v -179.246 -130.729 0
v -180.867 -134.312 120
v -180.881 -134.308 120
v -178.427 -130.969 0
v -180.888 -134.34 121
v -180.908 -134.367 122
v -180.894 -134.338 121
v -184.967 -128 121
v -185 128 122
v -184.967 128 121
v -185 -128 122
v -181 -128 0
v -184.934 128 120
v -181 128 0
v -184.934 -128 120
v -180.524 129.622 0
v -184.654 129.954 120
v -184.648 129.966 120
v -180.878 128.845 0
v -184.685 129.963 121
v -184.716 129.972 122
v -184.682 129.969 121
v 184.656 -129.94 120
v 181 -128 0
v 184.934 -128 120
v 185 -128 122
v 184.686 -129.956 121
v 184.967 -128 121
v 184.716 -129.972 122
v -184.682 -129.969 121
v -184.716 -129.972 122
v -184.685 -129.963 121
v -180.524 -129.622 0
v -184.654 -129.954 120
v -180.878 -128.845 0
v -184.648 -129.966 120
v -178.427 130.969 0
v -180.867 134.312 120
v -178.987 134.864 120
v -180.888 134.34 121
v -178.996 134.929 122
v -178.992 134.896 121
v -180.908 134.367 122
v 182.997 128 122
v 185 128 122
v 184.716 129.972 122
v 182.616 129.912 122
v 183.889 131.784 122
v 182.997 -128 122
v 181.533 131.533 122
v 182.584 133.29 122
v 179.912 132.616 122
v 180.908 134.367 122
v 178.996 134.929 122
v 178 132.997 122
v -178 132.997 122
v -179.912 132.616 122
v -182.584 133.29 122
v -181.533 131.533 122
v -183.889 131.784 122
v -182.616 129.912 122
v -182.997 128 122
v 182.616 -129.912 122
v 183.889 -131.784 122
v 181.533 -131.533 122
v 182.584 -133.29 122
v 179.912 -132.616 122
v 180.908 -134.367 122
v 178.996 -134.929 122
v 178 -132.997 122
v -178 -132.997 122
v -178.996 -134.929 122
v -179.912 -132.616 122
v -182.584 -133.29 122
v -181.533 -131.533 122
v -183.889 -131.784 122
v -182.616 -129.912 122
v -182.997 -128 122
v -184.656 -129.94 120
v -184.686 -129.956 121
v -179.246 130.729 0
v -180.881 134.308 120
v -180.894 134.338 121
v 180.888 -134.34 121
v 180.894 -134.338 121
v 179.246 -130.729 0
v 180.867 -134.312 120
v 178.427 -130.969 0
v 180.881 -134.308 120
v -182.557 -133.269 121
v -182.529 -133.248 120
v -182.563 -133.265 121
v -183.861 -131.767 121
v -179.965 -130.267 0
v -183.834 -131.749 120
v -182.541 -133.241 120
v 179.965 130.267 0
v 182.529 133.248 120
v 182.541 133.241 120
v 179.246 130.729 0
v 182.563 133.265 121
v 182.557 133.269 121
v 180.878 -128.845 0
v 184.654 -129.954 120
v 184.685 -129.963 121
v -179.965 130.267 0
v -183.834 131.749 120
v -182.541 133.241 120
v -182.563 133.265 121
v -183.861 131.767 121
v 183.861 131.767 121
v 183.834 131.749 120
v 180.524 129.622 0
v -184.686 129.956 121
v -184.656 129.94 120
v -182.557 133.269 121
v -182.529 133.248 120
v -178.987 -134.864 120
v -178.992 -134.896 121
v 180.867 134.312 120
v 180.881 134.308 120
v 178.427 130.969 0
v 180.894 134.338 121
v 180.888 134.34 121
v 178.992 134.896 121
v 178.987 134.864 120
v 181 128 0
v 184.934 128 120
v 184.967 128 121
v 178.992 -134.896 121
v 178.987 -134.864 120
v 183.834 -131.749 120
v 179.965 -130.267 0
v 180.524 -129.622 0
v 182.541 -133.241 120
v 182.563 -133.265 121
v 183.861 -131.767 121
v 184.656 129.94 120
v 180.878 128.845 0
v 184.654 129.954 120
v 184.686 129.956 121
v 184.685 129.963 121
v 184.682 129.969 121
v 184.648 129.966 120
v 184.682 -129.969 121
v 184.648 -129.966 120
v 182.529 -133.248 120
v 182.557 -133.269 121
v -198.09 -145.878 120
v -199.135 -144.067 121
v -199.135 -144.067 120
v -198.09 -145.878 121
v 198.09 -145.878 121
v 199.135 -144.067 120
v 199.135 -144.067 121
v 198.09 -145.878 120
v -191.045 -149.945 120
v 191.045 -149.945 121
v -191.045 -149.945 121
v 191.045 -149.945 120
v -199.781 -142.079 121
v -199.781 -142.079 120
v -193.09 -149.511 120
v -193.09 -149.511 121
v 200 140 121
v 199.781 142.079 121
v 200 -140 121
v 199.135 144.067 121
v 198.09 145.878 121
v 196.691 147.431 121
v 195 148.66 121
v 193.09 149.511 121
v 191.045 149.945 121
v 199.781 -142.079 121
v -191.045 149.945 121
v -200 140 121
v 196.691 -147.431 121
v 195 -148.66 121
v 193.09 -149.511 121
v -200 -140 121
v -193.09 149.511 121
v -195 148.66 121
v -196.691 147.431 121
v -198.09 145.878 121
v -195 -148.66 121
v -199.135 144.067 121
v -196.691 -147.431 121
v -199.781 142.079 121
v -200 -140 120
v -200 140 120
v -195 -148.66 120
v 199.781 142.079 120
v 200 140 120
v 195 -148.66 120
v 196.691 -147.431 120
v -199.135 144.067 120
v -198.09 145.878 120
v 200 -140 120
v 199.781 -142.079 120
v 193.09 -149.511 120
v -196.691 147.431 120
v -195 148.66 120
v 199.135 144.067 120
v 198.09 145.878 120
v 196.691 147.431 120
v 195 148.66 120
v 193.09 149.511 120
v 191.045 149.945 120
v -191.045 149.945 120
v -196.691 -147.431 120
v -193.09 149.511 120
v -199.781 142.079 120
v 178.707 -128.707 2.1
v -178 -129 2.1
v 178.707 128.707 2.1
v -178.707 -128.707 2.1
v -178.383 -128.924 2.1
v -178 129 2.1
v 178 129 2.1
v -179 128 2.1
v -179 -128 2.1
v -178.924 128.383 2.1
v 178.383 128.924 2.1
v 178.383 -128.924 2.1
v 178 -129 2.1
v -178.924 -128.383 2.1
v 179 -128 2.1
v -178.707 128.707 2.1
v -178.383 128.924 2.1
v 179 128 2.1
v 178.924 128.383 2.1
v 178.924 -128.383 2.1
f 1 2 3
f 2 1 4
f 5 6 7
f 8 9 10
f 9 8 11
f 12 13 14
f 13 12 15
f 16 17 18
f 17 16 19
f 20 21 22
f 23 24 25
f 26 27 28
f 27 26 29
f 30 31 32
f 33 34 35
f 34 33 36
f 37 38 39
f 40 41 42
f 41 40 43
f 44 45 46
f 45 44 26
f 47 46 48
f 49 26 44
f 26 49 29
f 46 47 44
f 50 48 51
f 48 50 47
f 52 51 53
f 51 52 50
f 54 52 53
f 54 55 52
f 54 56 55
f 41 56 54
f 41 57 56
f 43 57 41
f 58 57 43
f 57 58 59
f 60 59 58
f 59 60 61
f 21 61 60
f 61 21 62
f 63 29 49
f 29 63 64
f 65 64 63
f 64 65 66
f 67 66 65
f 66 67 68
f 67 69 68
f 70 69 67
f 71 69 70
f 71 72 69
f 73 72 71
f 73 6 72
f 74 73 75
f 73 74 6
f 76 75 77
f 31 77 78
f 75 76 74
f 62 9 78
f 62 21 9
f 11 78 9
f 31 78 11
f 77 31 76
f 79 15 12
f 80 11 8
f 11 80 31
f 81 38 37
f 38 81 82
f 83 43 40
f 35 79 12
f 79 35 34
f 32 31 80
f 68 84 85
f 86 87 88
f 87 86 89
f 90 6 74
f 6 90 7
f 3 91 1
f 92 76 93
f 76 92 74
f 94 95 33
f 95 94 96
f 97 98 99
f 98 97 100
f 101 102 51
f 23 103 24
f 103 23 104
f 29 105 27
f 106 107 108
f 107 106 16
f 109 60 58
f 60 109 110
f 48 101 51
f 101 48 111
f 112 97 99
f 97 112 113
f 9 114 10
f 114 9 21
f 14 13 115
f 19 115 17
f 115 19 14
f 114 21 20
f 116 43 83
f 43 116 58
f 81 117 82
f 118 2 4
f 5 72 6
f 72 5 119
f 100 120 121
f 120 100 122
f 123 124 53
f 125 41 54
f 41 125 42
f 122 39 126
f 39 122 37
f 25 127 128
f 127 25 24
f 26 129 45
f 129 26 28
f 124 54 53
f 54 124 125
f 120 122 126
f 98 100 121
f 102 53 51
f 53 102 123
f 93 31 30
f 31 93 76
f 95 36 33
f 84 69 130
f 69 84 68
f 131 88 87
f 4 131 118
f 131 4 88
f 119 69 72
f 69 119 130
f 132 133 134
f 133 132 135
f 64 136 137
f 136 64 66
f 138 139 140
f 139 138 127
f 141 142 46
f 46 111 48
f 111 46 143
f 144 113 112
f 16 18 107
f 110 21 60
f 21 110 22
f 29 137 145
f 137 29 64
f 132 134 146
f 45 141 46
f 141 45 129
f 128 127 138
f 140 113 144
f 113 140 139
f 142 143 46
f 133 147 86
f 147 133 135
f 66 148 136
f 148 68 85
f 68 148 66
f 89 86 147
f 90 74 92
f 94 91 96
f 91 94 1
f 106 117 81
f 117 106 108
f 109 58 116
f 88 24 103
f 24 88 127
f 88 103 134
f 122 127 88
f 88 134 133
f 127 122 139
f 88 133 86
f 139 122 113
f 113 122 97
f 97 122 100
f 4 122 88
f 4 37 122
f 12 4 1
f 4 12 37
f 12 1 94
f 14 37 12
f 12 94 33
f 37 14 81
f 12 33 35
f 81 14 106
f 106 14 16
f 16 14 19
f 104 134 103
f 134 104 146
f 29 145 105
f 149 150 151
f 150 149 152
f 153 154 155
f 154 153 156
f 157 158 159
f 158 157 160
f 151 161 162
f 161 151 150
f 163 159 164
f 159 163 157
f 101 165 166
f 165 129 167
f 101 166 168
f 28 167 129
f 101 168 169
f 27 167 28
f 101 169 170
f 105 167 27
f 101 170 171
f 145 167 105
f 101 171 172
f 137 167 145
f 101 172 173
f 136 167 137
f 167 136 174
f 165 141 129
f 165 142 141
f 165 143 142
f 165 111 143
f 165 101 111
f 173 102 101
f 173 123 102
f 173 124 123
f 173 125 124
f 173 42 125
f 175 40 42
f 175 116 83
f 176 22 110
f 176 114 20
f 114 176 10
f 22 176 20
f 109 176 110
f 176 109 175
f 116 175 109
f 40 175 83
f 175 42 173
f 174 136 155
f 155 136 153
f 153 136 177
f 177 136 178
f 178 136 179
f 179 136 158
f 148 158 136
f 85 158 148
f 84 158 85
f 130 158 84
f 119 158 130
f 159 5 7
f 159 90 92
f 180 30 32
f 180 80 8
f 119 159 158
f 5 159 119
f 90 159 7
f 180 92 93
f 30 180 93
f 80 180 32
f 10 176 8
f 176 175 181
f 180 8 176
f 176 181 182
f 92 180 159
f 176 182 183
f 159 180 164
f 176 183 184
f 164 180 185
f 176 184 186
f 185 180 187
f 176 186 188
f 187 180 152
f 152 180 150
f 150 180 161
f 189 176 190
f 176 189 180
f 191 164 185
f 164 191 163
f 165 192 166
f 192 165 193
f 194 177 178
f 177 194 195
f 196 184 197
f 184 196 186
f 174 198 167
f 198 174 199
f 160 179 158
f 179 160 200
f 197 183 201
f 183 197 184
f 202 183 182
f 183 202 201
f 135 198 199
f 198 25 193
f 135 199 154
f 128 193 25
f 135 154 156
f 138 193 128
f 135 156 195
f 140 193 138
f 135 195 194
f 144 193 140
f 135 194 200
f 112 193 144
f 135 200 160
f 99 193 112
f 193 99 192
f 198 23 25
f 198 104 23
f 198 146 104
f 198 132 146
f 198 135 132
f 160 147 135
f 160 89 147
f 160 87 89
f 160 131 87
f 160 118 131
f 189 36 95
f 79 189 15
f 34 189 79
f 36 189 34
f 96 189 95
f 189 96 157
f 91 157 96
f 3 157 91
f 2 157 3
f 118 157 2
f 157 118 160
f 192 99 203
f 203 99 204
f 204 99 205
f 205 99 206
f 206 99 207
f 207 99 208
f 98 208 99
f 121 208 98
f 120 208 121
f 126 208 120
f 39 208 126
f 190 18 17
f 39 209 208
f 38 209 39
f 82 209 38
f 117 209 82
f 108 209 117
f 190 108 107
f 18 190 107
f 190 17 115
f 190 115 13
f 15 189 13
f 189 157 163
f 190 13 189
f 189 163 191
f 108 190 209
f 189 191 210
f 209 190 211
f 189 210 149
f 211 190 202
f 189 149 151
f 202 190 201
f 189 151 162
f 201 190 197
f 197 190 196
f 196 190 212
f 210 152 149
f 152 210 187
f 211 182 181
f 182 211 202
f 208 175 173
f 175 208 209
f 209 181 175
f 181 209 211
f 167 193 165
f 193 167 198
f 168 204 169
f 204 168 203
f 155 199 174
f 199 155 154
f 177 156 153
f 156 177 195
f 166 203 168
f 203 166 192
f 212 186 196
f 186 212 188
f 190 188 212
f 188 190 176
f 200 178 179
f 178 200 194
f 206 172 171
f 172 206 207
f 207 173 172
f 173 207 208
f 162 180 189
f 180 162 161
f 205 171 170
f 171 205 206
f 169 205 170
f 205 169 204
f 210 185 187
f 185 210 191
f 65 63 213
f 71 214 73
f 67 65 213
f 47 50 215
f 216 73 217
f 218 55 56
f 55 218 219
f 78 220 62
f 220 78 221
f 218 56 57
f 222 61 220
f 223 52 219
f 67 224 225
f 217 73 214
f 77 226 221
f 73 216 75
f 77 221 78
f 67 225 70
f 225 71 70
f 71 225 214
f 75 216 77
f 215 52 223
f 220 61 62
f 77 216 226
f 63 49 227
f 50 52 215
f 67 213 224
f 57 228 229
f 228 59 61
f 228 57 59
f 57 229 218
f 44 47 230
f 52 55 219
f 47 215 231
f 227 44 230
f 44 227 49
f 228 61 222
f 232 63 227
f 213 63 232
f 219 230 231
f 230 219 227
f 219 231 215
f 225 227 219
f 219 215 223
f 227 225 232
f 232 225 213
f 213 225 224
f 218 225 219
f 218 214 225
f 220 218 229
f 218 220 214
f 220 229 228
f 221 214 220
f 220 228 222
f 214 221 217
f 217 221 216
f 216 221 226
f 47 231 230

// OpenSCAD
ovDimsOut=[400,300,120];
ovDimsIn=[358,258,99];
fudge=0.1;

*difference(){
  translate([0,0,ovDimsOut.z/2]) cube(ovDimsOut,center=true);
  translate([0,0,ovDimsOut.z-ovDimsIn.z/2+fudge/2]) cube(ovDimsIn+[0,0,fudge],true);
}

RAKO();
module RAKO(){
  ovDimsOut=[400,300,120];
  ovDimsIn=[358,258,99];
  
  outRad=10;
  minRad=1;
  wallThck=2;
  botDims=[ovDimsIn.x,ovDimsIn.y];
  topOffset=5;
  
  difference(){
    union(){
      body(wallThck);
      translate([0,0,ovDimsOut.z]) ring([ovDimsOut.x,ovDimsOut.y,3]);
    }
    translate([0,0,wallThck+fudge]) body();
  }
  
  module body(offSet=0){
  hull() for (ix=[-1,1],iy=[-1,1])
    translate([ix*(botDims.x/2-minRad),iy*(botDims.y/2-minRad),0]) 
      cylinder(r1=minRad+offSet,r2=topOffset+offSet,h=ovDimsOut.z+offSet);
  }
  //horizontal rings
  module ring(dims=[100,80,3], rad=10){
    hull() for (ix=[-1,1], iy=[-1,1])
      translate([ix*(dims.x/2-rad),iy*(dims.y/2-rad),0]) cylinder(r=rad,true);
  }
}
